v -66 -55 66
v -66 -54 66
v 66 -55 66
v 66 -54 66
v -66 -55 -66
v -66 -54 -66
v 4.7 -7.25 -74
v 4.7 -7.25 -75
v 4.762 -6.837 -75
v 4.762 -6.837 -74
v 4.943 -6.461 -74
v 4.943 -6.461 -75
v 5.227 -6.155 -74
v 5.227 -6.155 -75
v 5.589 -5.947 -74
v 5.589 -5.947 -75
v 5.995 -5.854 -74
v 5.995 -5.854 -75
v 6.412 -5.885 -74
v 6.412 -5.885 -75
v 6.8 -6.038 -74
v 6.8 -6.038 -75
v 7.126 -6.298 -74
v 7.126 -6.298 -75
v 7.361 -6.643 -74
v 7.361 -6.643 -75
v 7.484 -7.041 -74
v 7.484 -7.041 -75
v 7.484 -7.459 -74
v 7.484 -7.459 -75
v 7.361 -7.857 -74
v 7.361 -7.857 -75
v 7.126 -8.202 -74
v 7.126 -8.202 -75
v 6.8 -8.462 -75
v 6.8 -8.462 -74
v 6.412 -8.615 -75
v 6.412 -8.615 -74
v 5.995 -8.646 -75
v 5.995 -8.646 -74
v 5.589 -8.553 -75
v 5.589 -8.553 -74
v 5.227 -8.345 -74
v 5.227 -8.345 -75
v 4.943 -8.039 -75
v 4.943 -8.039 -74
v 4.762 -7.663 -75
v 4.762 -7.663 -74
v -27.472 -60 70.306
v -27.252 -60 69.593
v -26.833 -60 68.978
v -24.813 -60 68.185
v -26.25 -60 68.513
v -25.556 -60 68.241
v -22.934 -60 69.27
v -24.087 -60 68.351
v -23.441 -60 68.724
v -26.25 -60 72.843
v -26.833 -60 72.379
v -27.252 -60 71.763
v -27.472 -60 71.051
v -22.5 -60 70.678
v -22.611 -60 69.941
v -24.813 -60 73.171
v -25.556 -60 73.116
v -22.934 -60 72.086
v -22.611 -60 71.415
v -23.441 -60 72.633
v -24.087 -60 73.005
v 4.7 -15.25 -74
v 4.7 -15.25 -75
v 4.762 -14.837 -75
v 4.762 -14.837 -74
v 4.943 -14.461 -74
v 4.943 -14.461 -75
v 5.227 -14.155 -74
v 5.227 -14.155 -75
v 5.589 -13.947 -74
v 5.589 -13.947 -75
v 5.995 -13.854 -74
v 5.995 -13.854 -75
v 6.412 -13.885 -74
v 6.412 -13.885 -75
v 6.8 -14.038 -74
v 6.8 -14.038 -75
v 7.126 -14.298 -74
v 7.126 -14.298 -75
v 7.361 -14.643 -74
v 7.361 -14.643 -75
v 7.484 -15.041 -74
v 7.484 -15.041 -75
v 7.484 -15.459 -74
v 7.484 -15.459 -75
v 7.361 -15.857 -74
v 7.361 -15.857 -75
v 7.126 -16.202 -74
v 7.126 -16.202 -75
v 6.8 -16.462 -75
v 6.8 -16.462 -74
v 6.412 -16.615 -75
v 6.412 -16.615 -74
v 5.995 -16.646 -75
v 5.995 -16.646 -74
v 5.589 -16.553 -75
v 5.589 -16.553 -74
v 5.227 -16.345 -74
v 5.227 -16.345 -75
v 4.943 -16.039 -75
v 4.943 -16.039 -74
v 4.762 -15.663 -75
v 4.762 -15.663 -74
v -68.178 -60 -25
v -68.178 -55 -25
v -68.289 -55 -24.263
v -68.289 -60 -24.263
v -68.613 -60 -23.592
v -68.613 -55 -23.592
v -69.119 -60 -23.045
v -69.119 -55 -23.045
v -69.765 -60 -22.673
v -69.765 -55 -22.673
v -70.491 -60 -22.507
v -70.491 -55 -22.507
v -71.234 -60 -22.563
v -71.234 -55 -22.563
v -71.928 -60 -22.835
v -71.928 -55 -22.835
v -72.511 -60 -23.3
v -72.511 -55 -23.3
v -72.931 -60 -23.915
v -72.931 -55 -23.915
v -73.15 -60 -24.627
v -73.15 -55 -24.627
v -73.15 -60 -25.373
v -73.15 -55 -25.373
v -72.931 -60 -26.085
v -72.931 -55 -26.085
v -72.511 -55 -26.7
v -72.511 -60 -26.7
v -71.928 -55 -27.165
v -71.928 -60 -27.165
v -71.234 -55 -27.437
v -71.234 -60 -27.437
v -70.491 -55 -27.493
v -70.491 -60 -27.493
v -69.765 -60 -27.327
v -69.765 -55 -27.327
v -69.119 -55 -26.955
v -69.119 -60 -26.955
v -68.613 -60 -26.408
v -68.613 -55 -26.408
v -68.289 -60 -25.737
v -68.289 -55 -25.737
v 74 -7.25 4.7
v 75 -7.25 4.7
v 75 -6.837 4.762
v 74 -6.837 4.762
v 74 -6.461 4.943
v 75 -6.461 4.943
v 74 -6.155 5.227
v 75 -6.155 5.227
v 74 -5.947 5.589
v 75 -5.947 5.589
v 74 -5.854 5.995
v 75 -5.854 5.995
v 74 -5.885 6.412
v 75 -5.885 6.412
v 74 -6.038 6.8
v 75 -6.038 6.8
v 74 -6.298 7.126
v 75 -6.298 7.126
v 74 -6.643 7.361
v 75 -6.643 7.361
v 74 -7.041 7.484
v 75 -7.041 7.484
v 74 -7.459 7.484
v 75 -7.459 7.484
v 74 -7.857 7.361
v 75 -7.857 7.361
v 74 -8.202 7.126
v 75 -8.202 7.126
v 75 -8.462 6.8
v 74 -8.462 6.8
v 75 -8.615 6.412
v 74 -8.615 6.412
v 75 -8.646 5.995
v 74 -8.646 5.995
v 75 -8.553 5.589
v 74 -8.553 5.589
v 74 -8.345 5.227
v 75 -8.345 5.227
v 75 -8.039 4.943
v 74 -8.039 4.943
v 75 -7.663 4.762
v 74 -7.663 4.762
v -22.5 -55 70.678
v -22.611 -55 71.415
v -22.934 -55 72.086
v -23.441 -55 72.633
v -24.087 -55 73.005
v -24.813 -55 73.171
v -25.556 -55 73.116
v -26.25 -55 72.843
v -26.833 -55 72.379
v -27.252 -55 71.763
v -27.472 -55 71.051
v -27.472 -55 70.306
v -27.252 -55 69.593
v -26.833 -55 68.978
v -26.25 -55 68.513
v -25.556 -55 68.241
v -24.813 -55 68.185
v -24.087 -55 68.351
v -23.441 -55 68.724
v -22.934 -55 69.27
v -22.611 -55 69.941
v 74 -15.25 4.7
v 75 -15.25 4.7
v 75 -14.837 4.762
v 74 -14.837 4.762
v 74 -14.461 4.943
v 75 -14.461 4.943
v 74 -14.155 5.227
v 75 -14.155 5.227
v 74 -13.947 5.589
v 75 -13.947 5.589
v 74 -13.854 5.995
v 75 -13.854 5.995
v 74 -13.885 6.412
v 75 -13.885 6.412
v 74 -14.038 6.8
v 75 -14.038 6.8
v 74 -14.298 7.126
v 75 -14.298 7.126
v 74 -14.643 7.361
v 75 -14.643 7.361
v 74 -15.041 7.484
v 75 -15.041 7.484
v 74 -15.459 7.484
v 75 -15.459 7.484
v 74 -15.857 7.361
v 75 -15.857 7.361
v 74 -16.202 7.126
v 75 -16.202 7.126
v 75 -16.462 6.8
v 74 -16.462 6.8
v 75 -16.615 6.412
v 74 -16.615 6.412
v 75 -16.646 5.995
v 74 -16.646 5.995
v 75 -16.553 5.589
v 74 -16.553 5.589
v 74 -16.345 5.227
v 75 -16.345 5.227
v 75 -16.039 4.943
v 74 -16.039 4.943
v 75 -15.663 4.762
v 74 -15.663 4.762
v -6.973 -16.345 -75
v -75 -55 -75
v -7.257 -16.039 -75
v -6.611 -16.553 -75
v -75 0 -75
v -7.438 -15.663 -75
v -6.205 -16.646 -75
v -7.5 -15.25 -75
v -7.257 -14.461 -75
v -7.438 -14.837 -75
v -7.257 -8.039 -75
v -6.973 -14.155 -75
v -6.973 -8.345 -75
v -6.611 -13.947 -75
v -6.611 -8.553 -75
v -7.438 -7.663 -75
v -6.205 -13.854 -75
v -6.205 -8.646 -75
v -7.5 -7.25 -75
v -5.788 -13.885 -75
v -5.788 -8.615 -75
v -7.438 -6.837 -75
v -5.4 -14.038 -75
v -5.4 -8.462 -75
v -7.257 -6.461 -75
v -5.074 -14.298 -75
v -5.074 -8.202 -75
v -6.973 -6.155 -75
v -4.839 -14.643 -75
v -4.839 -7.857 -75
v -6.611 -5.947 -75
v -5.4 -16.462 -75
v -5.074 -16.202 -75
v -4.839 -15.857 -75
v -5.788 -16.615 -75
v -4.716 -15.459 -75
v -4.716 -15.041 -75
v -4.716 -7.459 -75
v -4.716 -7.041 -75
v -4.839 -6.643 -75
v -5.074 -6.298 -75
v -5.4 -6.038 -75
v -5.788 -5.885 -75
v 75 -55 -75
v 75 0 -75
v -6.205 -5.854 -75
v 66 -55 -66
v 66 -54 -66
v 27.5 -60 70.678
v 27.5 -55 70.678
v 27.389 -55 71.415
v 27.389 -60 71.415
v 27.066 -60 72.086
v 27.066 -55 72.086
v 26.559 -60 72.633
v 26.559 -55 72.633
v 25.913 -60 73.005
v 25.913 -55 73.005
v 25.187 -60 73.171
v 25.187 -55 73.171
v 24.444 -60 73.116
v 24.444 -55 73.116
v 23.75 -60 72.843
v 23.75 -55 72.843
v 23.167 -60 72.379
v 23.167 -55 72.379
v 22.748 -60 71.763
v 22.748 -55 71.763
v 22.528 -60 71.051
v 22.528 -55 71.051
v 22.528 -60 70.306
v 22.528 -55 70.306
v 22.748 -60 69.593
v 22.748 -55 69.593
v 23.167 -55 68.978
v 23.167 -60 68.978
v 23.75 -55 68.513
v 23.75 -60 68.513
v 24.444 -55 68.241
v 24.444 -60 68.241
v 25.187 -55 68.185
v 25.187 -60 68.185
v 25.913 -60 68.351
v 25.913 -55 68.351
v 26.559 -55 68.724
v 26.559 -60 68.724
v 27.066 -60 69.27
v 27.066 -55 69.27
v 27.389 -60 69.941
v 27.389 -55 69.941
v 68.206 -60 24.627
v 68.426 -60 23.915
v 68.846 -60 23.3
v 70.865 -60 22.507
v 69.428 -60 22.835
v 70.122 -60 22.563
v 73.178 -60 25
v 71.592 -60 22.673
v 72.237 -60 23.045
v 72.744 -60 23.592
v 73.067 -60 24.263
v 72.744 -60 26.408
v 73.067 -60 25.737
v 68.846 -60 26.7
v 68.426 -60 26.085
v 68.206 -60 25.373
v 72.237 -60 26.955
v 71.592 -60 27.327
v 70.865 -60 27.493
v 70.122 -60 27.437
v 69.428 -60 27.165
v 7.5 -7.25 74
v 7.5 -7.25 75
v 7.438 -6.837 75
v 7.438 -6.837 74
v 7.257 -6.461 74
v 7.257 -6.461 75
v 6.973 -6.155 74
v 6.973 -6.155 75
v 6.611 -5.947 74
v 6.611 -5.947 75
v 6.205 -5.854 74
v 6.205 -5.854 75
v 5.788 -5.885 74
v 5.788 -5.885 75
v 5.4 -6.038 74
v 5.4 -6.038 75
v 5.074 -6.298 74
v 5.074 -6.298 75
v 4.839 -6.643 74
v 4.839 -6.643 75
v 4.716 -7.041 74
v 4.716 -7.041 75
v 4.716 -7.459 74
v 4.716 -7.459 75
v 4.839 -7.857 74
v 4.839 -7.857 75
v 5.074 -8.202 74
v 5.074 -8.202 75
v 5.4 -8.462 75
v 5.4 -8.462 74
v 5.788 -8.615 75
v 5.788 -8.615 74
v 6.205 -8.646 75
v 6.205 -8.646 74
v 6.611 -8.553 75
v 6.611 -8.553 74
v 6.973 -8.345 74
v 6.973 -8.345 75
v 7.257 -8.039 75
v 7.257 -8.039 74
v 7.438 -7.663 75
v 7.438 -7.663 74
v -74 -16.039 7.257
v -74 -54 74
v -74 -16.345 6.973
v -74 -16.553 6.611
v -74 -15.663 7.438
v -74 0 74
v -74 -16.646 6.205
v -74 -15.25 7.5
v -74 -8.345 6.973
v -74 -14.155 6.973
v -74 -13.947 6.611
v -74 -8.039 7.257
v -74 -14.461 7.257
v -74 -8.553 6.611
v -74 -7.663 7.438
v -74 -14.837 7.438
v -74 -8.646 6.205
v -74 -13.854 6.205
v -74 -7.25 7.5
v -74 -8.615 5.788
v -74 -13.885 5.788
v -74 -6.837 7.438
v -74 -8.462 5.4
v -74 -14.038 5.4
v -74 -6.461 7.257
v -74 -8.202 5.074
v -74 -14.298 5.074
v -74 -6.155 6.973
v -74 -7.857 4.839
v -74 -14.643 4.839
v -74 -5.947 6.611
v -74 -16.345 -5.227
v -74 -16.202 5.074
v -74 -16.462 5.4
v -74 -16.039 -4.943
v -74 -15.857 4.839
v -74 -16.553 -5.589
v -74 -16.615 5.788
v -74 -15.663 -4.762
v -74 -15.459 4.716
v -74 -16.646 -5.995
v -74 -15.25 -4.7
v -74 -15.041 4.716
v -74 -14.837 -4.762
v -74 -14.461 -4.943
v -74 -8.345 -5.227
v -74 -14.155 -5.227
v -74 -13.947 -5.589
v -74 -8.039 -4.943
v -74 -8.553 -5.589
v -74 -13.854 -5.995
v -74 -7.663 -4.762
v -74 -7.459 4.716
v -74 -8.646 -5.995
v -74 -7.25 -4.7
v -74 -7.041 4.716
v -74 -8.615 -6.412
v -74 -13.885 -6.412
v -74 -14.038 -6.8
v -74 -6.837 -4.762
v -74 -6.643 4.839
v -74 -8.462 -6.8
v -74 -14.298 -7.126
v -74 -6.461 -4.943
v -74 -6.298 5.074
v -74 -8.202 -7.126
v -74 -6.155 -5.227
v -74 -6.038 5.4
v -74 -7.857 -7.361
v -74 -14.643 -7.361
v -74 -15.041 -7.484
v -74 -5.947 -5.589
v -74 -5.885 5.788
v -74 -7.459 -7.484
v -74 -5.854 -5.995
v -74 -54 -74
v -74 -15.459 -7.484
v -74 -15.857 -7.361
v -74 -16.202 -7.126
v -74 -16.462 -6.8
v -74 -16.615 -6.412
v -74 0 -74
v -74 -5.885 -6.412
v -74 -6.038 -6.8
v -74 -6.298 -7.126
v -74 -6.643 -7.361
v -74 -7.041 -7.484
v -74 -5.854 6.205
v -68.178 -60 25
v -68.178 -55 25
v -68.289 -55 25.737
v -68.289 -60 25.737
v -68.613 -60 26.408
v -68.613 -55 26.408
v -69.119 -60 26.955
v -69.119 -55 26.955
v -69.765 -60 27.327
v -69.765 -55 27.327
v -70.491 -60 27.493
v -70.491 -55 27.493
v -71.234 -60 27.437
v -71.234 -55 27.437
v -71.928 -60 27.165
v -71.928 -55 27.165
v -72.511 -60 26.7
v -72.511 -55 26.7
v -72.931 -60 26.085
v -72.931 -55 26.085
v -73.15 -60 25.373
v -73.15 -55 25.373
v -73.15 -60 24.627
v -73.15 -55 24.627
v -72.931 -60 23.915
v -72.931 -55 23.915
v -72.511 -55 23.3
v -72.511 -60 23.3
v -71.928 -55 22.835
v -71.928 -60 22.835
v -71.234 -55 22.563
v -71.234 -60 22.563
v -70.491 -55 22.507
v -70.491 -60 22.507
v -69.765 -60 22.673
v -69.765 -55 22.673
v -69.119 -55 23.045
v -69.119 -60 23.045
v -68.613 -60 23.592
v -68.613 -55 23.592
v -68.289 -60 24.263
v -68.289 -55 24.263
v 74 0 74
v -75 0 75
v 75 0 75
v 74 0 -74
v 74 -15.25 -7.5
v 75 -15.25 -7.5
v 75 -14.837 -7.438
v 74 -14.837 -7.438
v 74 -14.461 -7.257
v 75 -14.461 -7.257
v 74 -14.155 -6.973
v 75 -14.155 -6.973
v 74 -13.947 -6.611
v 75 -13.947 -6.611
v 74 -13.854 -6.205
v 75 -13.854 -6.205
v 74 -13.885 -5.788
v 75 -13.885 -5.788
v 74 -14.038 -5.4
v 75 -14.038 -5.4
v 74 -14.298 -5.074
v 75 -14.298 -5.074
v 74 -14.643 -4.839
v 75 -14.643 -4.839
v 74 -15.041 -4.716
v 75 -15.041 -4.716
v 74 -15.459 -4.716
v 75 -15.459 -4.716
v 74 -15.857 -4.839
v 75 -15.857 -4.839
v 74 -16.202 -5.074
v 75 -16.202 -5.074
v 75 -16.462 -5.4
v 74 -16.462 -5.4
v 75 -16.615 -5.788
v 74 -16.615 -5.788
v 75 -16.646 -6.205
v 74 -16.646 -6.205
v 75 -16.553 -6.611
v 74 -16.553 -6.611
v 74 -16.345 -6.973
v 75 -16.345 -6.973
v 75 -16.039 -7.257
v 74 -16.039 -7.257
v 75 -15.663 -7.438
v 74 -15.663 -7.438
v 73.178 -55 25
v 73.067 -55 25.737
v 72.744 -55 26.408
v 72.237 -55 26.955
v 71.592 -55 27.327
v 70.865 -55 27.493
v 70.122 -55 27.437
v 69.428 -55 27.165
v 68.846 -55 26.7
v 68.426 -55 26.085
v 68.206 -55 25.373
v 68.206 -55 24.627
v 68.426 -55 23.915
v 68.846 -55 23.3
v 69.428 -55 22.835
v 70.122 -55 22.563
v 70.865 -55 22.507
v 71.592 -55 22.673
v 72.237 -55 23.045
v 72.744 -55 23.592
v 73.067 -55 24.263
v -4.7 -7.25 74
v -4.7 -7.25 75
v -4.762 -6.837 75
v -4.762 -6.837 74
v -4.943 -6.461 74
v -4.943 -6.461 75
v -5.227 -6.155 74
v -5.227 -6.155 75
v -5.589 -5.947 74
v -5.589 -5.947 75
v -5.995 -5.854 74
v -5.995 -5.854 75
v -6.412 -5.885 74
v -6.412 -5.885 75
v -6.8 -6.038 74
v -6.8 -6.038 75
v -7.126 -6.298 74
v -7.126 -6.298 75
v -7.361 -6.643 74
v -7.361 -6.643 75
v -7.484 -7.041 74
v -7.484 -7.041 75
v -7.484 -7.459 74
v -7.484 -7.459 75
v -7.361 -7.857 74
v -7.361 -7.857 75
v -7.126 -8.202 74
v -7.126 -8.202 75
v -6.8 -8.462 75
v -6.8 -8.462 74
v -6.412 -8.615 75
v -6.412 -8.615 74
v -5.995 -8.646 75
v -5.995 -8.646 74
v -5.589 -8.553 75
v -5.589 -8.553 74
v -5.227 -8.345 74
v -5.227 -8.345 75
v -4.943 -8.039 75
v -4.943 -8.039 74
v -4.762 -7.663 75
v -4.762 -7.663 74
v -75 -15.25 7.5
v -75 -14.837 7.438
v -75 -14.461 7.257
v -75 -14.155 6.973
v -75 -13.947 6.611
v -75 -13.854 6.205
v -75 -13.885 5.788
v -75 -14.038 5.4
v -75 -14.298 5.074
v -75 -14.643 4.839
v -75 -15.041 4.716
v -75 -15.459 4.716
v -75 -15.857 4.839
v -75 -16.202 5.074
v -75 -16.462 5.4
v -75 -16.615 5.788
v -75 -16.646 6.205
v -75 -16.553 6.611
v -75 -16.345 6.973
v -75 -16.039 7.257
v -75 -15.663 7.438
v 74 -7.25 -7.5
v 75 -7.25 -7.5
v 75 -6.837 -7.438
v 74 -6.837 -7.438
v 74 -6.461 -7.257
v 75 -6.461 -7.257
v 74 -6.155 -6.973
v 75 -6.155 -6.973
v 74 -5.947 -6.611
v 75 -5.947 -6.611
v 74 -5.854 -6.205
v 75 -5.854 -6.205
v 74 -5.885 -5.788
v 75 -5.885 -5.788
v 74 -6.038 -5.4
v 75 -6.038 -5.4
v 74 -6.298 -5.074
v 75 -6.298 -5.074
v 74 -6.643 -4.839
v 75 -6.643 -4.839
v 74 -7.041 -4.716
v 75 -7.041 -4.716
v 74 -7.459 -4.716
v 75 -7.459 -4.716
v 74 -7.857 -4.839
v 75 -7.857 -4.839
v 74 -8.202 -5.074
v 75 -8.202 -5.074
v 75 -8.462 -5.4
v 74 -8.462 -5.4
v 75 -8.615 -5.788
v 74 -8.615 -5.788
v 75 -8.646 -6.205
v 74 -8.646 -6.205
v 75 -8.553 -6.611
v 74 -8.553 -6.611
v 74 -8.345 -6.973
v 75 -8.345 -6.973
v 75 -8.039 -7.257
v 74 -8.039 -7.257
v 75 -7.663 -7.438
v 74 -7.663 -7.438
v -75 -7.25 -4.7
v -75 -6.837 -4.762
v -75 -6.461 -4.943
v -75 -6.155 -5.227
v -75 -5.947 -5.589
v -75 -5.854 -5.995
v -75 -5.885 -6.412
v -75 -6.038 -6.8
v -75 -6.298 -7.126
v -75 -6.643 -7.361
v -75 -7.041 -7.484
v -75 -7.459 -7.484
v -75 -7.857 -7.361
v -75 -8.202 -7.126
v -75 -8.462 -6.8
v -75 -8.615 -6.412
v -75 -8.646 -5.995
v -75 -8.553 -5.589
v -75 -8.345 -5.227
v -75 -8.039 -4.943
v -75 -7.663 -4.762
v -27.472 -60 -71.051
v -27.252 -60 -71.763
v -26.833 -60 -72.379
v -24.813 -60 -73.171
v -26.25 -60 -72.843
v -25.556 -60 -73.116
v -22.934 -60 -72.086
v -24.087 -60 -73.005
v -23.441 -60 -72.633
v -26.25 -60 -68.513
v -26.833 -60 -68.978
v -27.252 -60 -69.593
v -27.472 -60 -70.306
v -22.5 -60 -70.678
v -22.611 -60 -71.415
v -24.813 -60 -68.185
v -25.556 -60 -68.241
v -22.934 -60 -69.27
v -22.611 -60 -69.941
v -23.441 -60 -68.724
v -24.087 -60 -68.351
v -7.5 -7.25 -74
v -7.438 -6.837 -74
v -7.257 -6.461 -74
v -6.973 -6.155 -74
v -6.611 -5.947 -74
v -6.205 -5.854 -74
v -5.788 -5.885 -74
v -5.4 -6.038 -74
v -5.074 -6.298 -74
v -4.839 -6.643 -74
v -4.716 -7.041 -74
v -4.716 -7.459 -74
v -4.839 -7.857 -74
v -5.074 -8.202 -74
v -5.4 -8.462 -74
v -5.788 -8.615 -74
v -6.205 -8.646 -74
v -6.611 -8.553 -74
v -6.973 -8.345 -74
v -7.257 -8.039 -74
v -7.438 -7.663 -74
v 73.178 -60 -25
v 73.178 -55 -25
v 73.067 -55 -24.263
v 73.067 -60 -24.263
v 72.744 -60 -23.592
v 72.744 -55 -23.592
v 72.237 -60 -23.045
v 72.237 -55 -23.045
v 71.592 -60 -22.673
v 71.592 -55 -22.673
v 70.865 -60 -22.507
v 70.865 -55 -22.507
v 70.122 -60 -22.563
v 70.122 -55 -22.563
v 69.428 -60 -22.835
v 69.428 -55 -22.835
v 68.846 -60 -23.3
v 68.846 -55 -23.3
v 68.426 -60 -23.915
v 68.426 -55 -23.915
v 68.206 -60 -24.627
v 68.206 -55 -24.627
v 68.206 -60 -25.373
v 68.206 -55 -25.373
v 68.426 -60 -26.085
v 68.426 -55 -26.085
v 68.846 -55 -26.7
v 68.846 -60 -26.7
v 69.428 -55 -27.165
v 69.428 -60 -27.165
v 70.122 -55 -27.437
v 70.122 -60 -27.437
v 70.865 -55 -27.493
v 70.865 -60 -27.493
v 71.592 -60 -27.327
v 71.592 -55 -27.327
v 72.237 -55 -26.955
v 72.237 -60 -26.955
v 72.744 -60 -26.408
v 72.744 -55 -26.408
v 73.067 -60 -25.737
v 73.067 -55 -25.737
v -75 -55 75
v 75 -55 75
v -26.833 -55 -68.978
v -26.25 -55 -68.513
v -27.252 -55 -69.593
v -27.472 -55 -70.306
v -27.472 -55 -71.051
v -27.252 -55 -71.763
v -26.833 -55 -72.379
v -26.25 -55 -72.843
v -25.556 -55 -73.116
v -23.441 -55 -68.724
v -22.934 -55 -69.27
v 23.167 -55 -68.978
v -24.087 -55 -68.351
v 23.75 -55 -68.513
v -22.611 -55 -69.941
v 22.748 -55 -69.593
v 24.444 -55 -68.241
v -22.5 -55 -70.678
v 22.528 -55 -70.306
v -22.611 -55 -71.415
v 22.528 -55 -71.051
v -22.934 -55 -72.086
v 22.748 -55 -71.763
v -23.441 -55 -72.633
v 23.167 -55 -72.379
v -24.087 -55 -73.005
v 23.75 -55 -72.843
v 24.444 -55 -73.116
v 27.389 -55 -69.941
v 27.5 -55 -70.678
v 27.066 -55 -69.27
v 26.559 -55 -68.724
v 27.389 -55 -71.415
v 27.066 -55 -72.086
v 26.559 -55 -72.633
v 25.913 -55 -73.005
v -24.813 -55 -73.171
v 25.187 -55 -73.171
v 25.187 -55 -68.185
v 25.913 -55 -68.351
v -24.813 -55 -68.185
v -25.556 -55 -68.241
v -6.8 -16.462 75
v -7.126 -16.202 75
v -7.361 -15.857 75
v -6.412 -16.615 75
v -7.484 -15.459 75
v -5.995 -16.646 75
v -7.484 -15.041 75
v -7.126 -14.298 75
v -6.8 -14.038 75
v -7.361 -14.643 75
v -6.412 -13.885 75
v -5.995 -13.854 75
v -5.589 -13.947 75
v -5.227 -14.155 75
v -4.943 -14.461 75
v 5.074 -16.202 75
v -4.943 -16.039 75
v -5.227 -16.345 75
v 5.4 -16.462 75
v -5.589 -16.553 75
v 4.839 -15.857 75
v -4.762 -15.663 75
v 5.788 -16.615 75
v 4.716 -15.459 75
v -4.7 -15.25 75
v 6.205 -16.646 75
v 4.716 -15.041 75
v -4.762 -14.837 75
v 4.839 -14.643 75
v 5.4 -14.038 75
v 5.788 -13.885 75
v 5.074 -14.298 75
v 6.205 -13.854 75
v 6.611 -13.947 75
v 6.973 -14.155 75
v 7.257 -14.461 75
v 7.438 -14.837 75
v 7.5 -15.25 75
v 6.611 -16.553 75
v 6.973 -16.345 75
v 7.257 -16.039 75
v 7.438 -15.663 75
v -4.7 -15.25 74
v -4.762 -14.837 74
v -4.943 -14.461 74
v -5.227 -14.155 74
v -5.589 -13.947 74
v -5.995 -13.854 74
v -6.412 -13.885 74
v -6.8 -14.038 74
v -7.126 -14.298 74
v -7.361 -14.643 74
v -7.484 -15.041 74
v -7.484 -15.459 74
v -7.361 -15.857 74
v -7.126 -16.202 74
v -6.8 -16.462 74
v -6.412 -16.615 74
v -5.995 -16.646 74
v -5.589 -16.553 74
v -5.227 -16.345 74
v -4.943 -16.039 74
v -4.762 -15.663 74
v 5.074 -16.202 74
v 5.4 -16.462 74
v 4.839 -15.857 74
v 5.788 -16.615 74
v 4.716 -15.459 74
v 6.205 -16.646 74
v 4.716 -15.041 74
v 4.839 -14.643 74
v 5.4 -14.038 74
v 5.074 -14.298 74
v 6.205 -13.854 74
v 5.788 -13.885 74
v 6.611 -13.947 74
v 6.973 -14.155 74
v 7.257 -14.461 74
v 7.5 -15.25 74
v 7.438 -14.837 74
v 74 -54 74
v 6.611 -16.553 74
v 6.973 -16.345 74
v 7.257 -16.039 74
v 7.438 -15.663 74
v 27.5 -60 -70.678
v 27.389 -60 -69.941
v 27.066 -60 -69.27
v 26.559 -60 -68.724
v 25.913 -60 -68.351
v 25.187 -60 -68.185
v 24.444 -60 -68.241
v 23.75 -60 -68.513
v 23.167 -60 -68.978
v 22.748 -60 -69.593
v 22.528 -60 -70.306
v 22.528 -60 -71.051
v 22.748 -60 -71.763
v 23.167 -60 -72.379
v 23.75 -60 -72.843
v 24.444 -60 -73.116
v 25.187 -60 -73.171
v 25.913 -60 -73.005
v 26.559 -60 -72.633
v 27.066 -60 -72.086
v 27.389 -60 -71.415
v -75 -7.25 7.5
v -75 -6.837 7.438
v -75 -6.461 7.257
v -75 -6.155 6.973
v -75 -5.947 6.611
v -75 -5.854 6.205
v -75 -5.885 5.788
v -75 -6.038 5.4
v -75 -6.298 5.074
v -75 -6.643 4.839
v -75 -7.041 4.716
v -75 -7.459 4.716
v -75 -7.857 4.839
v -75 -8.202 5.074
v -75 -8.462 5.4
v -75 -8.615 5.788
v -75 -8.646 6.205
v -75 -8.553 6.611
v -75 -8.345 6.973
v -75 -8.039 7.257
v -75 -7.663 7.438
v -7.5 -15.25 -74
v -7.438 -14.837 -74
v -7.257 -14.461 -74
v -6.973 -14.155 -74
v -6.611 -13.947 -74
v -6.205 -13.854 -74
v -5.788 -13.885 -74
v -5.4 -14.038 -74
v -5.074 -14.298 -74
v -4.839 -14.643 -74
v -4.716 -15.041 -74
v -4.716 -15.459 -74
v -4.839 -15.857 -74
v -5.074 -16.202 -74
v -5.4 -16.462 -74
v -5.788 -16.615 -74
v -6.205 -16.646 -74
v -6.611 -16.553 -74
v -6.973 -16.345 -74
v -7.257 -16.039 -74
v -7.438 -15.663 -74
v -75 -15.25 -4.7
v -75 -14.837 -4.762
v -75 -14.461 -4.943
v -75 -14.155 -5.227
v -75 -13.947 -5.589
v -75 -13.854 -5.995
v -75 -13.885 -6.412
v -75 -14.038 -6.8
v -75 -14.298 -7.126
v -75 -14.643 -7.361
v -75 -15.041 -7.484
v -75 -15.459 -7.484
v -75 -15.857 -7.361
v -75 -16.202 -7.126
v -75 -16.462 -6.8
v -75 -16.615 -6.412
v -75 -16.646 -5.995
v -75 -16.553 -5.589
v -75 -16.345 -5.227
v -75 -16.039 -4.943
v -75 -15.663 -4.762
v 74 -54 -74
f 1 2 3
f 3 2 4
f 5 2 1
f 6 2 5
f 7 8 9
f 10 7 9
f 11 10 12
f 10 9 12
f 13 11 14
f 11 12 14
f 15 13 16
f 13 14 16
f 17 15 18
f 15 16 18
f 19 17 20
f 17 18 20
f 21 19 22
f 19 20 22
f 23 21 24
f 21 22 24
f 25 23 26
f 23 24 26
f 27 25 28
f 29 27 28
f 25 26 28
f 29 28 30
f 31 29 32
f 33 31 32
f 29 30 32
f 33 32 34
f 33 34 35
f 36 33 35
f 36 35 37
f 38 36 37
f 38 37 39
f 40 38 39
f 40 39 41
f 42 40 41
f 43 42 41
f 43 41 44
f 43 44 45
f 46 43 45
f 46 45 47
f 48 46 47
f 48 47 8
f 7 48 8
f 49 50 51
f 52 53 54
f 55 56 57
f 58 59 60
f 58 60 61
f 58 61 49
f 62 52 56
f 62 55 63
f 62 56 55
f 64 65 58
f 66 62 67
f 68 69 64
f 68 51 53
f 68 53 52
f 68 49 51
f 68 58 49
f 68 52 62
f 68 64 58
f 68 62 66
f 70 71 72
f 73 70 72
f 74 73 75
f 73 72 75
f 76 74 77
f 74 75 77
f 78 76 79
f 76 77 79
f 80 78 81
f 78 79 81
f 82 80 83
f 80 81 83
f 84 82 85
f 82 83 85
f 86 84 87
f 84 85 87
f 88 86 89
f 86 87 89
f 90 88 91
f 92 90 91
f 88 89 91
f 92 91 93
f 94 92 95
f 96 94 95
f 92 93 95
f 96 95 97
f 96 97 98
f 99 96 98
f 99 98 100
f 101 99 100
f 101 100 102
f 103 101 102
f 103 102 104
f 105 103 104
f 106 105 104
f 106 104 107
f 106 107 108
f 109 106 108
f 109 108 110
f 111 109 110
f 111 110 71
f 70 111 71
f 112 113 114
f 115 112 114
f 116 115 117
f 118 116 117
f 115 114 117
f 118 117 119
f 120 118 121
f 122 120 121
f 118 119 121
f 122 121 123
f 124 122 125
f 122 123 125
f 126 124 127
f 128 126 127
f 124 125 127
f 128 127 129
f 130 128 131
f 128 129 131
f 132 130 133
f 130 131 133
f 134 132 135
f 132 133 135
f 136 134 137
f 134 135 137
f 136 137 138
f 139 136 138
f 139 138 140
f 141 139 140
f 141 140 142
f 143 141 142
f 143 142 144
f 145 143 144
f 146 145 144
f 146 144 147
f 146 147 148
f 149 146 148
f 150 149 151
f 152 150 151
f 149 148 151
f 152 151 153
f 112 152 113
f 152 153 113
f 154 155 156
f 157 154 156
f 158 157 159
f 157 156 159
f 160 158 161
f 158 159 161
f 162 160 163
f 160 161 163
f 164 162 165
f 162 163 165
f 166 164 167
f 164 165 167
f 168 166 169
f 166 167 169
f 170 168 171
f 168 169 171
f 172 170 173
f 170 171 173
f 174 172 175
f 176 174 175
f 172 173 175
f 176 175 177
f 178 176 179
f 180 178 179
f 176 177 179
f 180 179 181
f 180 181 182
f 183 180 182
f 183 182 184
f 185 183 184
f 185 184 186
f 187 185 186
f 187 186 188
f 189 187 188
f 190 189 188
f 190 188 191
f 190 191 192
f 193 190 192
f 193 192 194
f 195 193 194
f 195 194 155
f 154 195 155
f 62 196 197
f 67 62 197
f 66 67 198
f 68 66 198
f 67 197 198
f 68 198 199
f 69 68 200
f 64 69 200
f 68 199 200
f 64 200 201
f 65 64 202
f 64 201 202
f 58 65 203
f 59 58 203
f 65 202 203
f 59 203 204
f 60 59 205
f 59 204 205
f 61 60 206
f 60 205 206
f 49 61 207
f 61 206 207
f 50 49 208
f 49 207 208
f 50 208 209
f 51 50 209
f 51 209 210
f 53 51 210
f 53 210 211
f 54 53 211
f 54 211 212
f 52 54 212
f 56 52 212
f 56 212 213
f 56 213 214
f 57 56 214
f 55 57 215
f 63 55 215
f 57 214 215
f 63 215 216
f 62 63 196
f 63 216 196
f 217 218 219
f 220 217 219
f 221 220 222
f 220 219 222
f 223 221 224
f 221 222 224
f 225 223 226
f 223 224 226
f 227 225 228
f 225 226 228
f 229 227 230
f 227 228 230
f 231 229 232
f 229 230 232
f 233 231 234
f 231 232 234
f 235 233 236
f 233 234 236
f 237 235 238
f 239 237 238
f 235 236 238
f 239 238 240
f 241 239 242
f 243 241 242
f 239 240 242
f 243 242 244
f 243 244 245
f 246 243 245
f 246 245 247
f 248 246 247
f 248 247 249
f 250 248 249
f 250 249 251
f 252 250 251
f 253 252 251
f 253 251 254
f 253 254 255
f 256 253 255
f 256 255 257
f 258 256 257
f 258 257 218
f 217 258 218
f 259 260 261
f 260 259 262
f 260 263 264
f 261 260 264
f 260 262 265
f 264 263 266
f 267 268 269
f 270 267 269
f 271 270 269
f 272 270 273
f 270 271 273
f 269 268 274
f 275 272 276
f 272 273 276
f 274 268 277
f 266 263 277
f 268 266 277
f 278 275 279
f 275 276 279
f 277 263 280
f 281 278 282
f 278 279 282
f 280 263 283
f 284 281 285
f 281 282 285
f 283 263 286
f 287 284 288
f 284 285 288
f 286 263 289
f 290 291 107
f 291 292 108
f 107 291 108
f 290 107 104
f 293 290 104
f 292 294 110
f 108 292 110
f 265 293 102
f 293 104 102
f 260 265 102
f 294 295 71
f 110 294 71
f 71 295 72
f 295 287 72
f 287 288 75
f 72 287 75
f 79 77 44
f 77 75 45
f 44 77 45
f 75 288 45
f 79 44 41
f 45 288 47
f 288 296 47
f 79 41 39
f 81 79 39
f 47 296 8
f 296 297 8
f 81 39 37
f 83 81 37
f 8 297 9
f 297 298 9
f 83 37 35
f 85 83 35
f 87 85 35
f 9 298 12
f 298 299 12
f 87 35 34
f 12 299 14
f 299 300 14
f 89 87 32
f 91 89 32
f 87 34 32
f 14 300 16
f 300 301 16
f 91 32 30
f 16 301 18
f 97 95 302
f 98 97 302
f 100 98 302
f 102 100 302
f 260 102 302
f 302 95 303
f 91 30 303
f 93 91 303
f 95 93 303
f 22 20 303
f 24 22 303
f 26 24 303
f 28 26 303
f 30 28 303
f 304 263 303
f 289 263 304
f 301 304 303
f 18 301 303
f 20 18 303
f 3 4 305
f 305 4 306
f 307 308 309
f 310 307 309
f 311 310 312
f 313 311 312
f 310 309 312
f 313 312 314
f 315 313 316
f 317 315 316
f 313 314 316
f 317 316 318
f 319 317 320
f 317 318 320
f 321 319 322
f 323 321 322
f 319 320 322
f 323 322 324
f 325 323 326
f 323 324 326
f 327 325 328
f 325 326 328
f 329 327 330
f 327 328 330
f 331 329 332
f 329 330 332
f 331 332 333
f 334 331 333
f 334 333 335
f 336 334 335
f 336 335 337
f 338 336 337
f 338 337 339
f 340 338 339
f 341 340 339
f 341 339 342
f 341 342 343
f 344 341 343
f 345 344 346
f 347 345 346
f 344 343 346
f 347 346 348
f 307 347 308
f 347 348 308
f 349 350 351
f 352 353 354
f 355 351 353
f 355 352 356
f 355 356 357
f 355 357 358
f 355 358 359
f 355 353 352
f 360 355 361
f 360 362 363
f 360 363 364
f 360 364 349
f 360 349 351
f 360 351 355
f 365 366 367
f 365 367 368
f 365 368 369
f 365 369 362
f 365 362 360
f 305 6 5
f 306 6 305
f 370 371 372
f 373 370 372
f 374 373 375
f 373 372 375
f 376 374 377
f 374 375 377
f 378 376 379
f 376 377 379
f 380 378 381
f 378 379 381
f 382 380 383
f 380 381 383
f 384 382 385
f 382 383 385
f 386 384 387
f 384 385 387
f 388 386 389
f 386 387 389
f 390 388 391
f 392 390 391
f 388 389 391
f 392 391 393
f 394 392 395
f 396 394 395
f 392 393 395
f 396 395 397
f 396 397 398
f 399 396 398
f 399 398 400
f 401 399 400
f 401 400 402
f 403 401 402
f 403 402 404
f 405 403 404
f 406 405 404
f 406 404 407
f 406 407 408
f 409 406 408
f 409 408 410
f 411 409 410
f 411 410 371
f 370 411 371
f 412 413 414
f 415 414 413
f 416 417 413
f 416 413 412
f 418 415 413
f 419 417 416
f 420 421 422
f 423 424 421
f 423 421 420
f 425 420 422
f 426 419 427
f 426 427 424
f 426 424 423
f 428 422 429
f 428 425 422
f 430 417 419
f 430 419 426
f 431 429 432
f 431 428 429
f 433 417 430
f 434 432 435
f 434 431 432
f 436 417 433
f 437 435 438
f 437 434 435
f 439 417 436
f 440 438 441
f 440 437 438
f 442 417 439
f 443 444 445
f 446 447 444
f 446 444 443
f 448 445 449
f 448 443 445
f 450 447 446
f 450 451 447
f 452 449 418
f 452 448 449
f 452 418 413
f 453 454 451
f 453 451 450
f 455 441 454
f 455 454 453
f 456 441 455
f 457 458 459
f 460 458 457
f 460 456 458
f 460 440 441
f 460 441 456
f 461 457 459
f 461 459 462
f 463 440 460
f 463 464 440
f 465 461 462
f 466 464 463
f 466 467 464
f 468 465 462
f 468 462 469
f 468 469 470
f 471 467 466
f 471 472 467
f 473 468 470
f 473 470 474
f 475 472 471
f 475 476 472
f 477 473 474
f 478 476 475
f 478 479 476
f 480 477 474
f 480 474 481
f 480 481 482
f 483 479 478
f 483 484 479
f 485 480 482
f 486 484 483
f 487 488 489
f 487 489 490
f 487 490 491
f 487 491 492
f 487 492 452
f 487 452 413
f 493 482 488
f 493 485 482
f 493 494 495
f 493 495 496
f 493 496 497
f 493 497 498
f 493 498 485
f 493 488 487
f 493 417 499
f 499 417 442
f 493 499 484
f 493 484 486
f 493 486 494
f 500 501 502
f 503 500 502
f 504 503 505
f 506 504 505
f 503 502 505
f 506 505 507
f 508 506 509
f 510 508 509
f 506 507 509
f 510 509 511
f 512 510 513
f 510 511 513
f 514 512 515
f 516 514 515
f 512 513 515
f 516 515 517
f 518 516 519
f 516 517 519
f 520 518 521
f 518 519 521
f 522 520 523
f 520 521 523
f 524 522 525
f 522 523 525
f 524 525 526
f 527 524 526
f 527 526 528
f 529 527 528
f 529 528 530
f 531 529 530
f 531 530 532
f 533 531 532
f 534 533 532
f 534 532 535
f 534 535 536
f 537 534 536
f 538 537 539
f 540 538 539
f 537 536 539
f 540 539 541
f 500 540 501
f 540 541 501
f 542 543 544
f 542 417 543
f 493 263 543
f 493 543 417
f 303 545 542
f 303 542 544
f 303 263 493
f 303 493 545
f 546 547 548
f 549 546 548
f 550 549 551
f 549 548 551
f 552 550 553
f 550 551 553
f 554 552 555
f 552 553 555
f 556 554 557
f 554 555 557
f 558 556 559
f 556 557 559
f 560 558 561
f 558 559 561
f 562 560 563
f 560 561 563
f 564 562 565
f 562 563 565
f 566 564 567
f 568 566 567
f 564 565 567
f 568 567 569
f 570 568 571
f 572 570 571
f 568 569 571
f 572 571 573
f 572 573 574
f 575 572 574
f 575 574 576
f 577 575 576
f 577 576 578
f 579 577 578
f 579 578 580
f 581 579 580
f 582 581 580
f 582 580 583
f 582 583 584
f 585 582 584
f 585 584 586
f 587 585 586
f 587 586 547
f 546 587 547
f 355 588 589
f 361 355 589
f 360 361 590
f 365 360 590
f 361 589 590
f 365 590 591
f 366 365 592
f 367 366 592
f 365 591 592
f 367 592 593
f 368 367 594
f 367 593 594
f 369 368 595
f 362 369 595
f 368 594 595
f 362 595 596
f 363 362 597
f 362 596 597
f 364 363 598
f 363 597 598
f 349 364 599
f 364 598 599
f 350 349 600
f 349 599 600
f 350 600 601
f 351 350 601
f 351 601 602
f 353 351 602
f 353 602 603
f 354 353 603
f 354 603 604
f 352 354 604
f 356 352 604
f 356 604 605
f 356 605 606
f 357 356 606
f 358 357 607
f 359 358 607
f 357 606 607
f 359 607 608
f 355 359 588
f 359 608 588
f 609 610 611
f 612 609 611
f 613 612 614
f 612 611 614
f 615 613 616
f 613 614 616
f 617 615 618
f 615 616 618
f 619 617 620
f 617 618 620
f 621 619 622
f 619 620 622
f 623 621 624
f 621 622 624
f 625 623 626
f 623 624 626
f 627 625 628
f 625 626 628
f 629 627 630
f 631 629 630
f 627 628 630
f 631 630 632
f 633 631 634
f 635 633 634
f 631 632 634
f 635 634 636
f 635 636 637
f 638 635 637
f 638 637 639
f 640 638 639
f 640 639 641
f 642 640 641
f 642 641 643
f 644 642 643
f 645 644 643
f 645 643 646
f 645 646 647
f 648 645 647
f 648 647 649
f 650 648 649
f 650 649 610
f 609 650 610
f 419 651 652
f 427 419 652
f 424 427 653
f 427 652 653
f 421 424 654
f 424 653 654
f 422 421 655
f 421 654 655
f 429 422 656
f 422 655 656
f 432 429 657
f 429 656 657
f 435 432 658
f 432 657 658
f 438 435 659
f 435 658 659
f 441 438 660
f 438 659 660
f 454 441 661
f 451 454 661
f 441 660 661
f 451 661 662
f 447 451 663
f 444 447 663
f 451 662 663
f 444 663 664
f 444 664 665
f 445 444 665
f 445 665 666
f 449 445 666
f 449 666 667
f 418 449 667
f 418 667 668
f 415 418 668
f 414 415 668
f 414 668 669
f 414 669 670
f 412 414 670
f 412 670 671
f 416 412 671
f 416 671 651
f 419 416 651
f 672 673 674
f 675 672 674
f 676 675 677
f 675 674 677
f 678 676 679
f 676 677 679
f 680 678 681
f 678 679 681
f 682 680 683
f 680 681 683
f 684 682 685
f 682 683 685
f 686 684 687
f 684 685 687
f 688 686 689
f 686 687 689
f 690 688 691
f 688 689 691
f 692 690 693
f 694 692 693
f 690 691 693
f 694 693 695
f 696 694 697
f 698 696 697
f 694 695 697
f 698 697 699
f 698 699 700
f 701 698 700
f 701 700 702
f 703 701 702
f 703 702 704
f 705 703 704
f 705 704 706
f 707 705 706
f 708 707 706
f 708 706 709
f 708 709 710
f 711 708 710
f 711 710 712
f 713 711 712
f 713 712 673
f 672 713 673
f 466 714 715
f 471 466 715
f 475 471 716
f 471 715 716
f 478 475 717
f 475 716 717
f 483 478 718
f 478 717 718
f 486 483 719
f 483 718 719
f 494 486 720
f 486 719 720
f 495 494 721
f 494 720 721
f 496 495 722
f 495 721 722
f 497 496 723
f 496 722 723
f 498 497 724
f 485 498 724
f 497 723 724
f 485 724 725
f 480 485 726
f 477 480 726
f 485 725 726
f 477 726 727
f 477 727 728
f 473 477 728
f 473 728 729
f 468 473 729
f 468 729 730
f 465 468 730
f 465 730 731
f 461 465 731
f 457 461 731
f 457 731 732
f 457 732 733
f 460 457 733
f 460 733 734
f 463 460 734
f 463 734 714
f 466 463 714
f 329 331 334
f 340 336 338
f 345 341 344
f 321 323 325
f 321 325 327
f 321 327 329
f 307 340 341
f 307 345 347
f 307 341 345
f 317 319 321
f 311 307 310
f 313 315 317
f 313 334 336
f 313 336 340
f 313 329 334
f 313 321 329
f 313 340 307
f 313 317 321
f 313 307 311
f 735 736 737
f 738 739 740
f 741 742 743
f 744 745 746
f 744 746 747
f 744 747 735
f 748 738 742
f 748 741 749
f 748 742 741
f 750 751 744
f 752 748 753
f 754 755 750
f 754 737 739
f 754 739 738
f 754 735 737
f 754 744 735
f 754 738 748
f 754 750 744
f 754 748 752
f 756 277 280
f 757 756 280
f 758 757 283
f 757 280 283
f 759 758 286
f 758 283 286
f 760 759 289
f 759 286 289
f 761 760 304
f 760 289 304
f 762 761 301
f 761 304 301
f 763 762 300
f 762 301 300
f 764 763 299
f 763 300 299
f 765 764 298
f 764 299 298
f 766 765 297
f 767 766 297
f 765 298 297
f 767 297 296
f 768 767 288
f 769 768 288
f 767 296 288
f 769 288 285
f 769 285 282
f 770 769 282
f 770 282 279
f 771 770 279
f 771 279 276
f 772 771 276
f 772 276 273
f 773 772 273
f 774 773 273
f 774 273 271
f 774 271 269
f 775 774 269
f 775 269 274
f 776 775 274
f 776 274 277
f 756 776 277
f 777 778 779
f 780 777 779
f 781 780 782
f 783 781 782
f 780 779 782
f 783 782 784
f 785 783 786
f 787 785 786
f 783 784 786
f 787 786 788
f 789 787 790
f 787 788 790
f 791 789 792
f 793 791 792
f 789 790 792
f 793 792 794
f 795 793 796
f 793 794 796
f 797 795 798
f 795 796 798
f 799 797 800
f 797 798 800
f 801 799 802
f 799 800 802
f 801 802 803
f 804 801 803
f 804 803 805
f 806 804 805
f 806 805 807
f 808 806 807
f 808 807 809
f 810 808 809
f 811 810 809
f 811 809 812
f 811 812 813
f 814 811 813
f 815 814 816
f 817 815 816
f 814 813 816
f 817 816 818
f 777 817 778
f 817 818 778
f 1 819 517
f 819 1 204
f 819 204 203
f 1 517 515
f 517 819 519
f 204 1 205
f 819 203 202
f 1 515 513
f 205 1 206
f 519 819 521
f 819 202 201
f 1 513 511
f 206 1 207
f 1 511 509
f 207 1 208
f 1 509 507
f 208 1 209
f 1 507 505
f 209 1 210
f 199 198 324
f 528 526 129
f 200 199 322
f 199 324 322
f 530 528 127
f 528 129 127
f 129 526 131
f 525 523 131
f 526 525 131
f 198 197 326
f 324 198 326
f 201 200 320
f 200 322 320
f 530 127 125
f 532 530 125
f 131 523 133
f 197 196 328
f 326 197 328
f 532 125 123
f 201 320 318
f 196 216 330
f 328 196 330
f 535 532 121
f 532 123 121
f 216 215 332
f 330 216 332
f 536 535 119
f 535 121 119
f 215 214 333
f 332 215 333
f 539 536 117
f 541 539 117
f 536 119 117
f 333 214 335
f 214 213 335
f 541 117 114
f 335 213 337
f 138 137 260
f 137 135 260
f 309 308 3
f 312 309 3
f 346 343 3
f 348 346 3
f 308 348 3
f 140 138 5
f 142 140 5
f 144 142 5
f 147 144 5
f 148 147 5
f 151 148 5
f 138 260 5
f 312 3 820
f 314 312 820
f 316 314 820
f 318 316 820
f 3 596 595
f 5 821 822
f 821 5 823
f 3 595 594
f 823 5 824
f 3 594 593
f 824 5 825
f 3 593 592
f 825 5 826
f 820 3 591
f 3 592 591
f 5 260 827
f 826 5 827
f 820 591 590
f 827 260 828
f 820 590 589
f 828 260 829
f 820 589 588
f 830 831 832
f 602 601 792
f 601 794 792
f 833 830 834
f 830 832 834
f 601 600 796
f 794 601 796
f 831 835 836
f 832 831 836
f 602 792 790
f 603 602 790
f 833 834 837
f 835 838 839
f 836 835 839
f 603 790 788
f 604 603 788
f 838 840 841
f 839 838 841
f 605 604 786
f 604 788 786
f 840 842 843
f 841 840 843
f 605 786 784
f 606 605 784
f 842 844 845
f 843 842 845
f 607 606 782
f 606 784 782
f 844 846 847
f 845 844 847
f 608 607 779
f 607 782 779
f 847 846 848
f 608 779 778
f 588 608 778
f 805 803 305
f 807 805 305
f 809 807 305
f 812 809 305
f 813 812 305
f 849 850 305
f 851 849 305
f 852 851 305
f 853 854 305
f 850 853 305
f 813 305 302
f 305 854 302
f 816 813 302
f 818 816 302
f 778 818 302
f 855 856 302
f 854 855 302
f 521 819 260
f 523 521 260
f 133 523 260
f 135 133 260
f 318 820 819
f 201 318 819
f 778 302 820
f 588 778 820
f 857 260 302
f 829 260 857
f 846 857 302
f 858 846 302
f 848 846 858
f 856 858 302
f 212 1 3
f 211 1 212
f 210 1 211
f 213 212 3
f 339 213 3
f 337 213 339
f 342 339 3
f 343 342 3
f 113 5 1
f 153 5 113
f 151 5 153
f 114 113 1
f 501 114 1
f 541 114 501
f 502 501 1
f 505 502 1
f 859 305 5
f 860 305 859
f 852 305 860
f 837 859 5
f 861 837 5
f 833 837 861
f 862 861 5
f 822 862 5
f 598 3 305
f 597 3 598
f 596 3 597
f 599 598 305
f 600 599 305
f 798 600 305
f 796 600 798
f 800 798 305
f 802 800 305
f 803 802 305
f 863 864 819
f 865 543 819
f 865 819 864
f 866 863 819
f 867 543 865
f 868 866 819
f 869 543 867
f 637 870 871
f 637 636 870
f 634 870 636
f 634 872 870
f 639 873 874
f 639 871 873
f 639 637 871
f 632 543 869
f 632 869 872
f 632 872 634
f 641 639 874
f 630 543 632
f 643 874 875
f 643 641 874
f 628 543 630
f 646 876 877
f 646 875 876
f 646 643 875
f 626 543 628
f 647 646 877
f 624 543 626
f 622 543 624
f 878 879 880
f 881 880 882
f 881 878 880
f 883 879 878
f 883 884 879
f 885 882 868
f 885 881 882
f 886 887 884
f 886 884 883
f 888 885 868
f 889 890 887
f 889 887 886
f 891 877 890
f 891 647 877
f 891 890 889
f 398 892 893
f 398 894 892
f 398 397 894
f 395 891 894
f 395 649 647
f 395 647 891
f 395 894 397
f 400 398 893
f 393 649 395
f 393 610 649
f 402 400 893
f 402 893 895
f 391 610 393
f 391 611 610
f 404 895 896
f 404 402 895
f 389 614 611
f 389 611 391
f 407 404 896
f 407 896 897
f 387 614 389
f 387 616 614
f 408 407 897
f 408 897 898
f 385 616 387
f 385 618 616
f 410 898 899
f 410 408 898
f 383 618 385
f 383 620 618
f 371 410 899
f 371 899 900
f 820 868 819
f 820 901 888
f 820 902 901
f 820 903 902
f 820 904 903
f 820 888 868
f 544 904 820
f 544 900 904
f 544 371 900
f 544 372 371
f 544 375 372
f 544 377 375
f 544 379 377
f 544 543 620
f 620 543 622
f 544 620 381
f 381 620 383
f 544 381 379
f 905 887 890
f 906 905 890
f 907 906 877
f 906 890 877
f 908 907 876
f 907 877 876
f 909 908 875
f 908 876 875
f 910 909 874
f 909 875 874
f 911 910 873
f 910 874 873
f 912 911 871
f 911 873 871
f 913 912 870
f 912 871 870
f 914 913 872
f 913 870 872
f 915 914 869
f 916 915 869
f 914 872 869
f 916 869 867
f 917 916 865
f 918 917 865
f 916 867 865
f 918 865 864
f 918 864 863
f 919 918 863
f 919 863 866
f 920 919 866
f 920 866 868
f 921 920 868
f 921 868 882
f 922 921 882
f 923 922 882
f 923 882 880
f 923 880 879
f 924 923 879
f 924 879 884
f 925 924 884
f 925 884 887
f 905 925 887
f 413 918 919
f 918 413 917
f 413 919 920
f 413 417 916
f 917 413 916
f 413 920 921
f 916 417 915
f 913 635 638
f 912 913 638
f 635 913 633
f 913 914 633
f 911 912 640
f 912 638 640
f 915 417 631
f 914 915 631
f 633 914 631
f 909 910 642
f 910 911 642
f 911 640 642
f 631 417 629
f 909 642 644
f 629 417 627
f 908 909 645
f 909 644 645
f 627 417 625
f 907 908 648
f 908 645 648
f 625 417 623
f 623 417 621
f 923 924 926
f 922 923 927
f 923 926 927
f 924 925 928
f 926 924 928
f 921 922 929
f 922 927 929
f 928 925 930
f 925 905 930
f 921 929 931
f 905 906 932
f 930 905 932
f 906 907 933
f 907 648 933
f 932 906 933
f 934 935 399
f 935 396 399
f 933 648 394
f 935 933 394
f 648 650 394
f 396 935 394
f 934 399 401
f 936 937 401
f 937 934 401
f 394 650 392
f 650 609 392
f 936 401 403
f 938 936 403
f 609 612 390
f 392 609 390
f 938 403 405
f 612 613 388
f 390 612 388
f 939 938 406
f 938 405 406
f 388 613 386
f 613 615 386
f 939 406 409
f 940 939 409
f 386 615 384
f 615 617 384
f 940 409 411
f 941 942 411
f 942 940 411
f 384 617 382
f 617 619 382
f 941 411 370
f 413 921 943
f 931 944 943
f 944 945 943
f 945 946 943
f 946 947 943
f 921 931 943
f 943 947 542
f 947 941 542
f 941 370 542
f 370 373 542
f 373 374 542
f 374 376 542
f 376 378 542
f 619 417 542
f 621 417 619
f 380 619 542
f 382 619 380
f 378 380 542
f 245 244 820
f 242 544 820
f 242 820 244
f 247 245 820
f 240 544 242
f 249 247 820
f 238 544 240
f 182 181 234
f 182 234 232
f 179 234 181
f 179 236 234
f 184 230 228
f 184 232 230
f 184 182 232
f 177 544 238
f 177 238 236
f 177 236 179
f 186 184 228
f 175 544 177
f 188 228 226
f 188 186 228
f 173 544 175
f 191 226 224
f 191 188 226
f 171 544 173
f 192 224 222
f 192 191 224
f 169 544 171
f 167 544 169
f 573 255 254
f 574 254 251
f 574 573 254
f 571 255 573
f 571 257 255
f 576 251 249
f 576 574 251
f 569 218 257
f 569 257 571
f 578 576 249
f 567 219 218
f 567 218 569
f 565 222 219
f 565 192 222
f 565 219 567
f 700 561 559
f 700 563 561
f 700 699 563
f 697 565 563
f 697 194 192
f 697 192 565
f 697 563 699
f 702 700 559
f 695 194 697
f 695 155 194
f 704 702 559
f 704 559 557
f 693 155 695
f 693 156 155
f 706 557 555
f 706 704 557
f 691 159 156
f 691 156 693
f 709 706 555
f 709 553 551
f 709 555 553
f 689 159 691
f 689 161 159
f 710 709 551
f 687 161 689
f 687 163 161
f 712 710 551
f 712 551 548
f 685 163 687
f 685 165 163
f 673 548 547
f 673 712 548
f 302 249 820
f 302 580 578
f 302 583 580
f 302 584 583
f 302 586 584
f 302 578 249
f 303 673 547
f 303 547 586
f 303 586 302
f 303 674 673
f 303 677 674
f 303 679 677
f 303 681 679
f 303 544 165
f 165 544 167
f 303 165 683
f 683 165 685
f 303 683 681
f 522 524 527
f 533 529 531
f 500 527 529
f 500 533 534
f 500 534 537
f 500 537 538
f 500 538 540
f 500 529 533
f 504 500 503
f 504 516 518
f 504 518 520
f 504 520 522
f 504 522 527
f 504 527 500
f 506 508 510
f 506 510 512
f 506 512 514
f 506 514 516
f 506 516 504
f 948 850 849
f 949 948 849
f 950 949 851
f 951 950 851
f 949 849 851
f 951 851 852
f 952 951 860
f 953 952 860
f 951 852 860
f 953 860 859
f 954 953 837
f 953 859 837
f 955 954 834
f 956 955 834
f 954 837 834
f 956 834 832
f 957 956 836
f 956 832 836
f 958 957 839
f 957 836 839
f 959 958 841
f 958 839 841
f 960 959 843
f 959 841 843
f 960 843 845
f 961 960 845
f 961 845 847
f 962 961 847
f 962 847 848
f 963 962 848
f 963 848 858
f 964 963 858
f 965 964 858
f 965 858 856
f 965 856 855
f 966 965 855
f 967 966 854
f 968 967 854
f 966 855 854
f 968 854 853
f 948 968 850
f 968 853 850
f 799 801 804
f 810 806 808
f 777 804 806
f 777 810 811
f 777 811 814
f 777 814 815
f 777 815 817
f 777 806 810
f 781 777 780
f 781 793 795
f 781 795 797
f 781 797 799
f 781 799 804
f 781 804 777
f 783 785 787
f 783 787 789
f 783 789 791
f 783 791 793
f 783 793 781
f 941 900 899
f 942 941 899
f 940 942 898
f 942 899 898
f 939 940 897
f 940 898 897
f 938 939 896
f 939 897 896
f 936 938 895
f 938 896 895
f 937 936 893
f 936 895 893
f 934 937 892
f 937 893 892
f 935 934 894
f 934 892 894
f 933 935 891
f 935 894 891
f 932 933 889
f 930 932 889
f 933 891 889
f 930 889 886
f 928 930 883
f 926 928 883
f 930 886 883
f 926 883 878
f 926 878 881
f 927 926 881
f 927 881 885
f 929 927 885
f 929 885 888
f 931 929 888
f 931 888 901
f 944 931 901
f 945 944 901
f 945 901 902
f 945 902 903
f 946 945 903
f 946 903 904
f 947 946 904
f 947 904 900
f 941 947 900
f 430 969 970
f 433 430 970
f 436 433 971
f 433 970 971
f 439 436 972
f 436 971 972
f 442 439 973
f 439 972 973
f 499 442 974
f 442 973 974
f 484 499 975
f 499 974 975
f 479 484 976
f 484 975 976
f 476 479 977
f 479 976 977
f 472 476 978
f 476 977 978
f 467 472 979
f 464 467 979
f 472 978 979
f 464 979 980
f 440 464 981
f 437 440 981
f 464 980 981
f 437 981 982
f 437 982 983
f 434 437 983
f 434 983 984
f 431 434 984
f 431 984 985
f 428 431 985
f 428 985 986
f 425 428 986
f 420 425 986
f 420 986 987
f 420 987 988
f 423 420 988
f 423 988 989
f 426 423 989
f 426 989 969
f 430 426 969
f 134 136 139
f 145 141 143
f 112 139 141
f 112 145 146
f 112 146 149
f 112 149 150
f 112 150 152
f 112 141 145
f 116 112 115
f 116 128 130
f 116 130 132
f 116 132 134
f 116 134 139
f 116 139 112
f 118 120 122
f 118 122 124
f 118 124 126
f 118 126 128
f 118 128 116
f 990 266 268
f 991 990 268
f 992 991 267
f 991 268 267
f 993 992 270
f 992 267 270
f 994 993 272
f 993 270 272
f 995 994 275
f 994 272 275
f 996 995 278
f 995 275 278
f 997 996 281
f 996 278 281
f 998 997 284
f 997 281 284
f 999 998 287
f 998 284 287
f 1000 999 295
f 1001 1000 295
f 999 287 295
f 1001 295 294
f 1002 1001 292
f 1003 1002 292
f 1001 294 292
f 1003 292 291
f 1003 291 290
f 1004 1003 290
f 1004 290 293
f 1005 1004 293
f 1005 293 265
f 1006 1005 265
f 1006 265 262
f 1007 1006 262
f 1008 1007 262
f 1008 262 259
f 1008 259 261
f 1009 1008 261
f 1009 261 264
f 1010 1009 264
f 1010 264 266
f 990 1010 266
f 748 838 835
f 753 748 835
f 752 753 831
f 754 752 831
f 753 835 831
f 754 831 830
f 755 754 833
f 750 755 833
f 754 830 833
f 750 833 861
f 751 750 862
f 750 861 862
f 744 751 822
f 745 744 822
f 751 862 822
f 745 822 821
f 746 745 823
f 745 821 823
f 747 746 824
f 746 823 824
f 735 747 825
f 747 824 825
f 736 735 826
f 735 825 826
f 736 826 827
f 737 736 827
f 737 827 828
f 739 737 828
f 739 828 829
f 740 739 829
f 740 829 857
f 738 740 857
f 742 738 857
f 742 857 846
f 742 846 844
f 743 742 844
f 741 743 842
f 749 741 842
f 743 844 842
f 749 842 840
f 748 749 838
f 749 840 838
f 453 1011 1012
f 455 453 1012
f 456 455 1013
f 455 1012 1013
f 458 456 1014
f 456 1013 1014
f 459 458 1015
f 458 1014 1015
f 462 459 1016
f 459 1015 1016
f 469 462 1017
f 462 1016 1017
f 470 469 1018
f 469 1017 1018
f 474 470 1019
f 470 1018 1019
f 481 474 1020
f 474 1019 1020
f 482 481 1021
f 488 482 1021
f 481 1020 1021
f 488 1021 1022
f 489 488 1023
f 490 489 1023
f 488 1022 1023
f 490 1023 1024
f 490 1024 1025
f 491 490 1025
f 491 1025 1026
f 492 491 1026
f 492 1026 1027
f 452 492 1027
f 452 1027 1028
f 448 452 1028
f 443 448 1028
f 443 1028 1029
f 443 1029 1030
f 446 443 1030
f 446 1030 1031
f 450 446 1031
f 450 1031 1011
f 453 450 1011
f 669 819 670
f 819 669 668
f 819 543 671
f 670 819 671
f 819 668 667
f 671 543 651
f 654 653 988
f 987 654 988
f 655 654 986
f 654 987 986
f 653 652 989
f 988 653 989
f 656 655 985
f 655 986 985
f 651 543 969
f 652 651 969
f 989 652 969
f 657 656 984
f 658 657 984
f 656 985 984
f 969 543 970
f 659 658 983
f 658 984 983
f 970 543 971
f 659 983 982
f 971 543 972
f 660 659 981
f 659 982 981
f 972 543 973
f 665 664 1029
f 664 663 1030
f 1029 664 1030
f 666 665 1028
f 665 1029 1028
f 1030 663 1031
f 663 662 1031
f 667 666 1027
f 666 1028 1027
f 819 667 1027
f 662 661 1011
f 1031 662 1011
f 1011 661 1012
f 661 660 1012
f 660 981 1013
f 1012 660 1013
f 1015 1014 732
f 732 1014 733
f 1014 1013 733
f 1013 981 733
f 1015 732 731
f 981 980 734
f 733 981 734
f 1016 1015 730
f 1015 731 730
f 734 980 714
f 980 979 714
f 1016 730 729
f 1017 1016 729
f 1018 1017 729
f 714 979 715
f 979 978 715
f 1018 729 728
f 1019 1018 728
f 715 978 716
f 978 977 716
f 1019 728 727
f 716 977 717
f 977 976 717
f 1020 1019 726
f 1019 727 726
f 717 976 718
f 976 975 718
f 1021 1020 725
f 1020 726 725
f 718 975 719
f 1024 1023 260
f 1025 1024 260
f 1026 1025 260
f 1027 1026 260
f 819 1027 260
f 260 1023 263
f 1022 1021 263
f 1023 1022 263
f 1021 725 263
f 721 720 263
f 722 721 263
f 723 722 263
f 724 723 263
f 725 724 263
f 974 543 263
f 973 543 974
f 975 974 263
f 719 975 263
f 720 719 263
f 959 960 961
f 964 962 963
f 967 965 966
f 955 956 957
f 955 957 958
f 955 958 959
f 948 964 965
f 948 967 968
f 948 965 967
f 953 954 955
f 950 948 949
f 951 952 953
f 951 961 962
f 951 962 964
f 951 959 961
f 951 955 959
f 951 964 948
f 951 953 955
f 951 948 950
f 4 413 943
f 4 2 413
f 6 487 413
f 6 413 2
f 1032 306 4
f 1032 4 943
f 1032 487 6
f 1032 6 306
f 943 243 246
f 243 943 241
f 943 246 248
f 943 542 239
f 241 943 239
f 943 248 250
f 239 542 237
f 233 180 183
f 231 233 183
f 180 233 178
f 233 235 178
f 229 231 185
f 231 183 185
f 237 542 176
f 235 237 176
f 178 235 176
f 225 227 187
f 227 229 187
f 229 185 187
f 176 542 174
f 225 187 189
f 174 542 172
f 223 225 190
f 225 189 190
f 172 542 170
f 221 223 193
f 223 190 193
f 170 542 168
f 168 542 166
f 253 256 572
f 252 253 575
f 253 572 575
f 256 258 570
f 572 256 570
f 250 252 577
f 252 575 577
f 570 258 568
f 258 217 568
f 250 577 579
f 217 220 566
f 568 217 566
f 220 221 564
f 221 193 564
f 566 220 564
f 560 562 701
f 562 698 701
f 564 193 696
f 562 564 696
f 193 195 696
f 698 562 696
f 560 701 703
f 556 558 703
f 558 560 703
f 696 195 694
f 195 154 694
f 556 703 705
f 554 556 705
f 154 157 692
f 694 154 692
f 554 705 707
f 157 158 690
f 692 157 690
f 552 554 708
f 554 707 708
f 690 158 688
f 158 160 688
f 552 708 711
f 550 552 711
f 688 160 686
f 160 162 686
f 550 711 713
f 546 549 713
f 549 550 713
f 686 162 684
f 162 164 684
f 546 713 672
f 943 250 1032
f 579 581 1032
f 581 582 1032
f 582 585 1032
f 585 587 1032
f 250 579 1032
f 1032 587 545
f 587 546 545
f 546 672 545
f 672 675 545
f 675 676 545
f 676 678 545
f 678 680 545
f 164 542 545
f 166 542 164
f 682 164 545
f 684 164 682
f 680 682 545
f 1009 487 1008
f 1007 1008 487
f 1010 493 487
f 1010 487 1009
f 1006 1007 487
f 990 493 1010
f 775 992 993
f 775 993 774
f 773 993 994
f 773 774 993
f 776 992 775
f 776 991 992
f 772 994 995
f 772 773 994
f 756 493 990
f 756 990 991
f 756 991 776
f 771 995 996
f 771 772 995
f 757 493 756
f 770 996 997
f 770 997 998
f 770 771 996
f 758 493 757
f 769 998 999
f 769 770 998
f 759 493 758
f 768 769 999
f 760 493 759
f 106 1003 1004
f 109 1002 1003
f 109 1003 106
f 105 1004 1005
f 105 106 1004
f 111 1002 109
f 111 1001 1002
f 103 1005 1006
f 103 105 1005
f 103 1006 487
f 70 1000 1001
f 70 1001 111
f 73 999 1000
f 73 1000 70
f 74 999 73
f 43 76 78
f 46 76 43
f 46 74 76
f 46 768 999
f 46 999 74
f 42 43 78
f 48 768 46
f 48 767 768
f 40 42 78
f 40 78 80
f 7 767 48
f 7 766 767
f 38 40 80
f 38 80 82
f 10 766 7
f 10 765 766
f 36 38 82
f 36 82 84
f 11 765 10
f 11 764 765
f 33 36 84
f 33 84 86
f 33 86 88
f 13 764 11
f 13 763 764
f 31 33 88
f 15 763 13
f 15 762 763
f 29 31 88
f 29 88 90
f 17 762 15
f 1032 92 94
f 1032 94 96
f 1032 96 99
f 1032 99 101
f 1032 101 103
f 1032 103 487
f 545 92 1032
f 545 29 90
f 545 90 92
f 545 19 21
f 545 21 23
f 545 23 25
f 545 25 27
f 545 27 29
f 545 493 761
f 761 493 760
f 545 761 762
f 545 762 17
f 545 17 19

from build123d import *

# Parameters (mm, degrees)
SKETCH1_W           = 150
SKETCH1_H           = 150
BOSS_EXTRUDE1_DEPTH = 55
SKETCH2_W           = 148
SKETCH2_H           = 148
CUT_EXTRUDE1_DEPTH  = 54
SKETCH3_W           = 132
SKETCH3_H           = 132
CUT_EXTRUDE2_DEPTH  = 2
SKETCH6_R           = 2.5
BOSS_EXTRUDE5_DEPTH = 5
SKETCH9_R           = 1.4
CUT_EXTRUDE4_DEPTH  = 10
CIRPATTERN1_COUNT   = 4


with BuildPart() as part:
    # Sketch1 → Boss-Extrude1 (new body)
    with BuildSketch(Plane(origin=(0, 0, 0), x_dir=(1, 0, 0), z_dir=(0, 1, 0))):
        Rectangle(SKETCH1_W, SKETCH1_H)
    extrude(amount=-BOSS_EXTRUDE1_DEPTH)

    # Sketch2 → Cut-Extrude1 (cut)
    with BuildSketch(Plane(origin=(0, 0, 0), x_dir=(1, 0, 0), z_dir=(0, 1, 0))):
        Rectangle(SKETCH2_W, SKETCH2_H)
    extrude(amount=-CUT_EXTRUDE1_DEPTH, mode=Mode.SUBTRACT)

    # Sketch3 → Cut-Extrude2 (cut, through all)
    with BuildSketch(Plane(origin=(0, -54, 0), x_dir=(1, 0, 0), z_dir=(0, 1, 0))):
        Rectangle(SKETCH3_W, SKETCH3_H)
    extrude(amount=-CUT_EXTRUDE2_DEPTH, mode=Mode.SUBTRACT)

    # Sketch6 → Boss-Extrude5 (add)
    with BuildSketch(Plane.XZ.offset(55)):
        with Locations((-70.678187872, -25)):
            Circle(SKETCH6_R)
        with Locations((-70.678187872, 25)):
            Circle(SKETCH6_R)
        with Locations((25, 70.678187872)):
            Circle(SKETCH6_R)
        with Locations((-25, 70.678187872)):
            Circle(SKETCH6_R)
        with Locations((70.678187872, -25)):
            Circle(SKETCH6_R)
        with Locations((70.678187872, 25)):
            Circle(SKETCH6_R)
        with Locations((-25, -70.678187872)):
            Circle(SKETCH6_R)
        with Locations((25, -70.678187872)):
            Circle(SKETCH6_R)
    extrude(amount=BOSS_EXTRUDE5_DEPTH)

    # Sketch9 → Cut-Extrude4 (cut)
    with BuildSketch(Plane.ZY.offset(75)):
        with Locations((-6.1, -7.25)):
            Circle(SKETCH9_R)
        with Locations((6.1, -7.25)):
            Circle(SKETCH9_R)
        with Locations((6.1, -15.25)):
            Circle(SKETCH9_R)
        with Locations((-6.1, -15.25)):
            Circle(SKETCH9_R)
    cut_extrude4 = extrude(amount=-CUT_EXTRUDE4_DEPTH, mode=Mode.SUBTRACT)

    # CirPattern1: Cut-Extrude4 ×4 about axis
    cirpattern1_axis = Axis((0, 0, 0), (0, 1, 0))
    for i in range(1, CIRPATTERN1_COUNT):
        add(cut_extrude4.rotate(cirpattern1_axis, i * 360 / CIRPATTERN1_COUNT), mode=Mode.SUBTRACT)


solid = part.part
